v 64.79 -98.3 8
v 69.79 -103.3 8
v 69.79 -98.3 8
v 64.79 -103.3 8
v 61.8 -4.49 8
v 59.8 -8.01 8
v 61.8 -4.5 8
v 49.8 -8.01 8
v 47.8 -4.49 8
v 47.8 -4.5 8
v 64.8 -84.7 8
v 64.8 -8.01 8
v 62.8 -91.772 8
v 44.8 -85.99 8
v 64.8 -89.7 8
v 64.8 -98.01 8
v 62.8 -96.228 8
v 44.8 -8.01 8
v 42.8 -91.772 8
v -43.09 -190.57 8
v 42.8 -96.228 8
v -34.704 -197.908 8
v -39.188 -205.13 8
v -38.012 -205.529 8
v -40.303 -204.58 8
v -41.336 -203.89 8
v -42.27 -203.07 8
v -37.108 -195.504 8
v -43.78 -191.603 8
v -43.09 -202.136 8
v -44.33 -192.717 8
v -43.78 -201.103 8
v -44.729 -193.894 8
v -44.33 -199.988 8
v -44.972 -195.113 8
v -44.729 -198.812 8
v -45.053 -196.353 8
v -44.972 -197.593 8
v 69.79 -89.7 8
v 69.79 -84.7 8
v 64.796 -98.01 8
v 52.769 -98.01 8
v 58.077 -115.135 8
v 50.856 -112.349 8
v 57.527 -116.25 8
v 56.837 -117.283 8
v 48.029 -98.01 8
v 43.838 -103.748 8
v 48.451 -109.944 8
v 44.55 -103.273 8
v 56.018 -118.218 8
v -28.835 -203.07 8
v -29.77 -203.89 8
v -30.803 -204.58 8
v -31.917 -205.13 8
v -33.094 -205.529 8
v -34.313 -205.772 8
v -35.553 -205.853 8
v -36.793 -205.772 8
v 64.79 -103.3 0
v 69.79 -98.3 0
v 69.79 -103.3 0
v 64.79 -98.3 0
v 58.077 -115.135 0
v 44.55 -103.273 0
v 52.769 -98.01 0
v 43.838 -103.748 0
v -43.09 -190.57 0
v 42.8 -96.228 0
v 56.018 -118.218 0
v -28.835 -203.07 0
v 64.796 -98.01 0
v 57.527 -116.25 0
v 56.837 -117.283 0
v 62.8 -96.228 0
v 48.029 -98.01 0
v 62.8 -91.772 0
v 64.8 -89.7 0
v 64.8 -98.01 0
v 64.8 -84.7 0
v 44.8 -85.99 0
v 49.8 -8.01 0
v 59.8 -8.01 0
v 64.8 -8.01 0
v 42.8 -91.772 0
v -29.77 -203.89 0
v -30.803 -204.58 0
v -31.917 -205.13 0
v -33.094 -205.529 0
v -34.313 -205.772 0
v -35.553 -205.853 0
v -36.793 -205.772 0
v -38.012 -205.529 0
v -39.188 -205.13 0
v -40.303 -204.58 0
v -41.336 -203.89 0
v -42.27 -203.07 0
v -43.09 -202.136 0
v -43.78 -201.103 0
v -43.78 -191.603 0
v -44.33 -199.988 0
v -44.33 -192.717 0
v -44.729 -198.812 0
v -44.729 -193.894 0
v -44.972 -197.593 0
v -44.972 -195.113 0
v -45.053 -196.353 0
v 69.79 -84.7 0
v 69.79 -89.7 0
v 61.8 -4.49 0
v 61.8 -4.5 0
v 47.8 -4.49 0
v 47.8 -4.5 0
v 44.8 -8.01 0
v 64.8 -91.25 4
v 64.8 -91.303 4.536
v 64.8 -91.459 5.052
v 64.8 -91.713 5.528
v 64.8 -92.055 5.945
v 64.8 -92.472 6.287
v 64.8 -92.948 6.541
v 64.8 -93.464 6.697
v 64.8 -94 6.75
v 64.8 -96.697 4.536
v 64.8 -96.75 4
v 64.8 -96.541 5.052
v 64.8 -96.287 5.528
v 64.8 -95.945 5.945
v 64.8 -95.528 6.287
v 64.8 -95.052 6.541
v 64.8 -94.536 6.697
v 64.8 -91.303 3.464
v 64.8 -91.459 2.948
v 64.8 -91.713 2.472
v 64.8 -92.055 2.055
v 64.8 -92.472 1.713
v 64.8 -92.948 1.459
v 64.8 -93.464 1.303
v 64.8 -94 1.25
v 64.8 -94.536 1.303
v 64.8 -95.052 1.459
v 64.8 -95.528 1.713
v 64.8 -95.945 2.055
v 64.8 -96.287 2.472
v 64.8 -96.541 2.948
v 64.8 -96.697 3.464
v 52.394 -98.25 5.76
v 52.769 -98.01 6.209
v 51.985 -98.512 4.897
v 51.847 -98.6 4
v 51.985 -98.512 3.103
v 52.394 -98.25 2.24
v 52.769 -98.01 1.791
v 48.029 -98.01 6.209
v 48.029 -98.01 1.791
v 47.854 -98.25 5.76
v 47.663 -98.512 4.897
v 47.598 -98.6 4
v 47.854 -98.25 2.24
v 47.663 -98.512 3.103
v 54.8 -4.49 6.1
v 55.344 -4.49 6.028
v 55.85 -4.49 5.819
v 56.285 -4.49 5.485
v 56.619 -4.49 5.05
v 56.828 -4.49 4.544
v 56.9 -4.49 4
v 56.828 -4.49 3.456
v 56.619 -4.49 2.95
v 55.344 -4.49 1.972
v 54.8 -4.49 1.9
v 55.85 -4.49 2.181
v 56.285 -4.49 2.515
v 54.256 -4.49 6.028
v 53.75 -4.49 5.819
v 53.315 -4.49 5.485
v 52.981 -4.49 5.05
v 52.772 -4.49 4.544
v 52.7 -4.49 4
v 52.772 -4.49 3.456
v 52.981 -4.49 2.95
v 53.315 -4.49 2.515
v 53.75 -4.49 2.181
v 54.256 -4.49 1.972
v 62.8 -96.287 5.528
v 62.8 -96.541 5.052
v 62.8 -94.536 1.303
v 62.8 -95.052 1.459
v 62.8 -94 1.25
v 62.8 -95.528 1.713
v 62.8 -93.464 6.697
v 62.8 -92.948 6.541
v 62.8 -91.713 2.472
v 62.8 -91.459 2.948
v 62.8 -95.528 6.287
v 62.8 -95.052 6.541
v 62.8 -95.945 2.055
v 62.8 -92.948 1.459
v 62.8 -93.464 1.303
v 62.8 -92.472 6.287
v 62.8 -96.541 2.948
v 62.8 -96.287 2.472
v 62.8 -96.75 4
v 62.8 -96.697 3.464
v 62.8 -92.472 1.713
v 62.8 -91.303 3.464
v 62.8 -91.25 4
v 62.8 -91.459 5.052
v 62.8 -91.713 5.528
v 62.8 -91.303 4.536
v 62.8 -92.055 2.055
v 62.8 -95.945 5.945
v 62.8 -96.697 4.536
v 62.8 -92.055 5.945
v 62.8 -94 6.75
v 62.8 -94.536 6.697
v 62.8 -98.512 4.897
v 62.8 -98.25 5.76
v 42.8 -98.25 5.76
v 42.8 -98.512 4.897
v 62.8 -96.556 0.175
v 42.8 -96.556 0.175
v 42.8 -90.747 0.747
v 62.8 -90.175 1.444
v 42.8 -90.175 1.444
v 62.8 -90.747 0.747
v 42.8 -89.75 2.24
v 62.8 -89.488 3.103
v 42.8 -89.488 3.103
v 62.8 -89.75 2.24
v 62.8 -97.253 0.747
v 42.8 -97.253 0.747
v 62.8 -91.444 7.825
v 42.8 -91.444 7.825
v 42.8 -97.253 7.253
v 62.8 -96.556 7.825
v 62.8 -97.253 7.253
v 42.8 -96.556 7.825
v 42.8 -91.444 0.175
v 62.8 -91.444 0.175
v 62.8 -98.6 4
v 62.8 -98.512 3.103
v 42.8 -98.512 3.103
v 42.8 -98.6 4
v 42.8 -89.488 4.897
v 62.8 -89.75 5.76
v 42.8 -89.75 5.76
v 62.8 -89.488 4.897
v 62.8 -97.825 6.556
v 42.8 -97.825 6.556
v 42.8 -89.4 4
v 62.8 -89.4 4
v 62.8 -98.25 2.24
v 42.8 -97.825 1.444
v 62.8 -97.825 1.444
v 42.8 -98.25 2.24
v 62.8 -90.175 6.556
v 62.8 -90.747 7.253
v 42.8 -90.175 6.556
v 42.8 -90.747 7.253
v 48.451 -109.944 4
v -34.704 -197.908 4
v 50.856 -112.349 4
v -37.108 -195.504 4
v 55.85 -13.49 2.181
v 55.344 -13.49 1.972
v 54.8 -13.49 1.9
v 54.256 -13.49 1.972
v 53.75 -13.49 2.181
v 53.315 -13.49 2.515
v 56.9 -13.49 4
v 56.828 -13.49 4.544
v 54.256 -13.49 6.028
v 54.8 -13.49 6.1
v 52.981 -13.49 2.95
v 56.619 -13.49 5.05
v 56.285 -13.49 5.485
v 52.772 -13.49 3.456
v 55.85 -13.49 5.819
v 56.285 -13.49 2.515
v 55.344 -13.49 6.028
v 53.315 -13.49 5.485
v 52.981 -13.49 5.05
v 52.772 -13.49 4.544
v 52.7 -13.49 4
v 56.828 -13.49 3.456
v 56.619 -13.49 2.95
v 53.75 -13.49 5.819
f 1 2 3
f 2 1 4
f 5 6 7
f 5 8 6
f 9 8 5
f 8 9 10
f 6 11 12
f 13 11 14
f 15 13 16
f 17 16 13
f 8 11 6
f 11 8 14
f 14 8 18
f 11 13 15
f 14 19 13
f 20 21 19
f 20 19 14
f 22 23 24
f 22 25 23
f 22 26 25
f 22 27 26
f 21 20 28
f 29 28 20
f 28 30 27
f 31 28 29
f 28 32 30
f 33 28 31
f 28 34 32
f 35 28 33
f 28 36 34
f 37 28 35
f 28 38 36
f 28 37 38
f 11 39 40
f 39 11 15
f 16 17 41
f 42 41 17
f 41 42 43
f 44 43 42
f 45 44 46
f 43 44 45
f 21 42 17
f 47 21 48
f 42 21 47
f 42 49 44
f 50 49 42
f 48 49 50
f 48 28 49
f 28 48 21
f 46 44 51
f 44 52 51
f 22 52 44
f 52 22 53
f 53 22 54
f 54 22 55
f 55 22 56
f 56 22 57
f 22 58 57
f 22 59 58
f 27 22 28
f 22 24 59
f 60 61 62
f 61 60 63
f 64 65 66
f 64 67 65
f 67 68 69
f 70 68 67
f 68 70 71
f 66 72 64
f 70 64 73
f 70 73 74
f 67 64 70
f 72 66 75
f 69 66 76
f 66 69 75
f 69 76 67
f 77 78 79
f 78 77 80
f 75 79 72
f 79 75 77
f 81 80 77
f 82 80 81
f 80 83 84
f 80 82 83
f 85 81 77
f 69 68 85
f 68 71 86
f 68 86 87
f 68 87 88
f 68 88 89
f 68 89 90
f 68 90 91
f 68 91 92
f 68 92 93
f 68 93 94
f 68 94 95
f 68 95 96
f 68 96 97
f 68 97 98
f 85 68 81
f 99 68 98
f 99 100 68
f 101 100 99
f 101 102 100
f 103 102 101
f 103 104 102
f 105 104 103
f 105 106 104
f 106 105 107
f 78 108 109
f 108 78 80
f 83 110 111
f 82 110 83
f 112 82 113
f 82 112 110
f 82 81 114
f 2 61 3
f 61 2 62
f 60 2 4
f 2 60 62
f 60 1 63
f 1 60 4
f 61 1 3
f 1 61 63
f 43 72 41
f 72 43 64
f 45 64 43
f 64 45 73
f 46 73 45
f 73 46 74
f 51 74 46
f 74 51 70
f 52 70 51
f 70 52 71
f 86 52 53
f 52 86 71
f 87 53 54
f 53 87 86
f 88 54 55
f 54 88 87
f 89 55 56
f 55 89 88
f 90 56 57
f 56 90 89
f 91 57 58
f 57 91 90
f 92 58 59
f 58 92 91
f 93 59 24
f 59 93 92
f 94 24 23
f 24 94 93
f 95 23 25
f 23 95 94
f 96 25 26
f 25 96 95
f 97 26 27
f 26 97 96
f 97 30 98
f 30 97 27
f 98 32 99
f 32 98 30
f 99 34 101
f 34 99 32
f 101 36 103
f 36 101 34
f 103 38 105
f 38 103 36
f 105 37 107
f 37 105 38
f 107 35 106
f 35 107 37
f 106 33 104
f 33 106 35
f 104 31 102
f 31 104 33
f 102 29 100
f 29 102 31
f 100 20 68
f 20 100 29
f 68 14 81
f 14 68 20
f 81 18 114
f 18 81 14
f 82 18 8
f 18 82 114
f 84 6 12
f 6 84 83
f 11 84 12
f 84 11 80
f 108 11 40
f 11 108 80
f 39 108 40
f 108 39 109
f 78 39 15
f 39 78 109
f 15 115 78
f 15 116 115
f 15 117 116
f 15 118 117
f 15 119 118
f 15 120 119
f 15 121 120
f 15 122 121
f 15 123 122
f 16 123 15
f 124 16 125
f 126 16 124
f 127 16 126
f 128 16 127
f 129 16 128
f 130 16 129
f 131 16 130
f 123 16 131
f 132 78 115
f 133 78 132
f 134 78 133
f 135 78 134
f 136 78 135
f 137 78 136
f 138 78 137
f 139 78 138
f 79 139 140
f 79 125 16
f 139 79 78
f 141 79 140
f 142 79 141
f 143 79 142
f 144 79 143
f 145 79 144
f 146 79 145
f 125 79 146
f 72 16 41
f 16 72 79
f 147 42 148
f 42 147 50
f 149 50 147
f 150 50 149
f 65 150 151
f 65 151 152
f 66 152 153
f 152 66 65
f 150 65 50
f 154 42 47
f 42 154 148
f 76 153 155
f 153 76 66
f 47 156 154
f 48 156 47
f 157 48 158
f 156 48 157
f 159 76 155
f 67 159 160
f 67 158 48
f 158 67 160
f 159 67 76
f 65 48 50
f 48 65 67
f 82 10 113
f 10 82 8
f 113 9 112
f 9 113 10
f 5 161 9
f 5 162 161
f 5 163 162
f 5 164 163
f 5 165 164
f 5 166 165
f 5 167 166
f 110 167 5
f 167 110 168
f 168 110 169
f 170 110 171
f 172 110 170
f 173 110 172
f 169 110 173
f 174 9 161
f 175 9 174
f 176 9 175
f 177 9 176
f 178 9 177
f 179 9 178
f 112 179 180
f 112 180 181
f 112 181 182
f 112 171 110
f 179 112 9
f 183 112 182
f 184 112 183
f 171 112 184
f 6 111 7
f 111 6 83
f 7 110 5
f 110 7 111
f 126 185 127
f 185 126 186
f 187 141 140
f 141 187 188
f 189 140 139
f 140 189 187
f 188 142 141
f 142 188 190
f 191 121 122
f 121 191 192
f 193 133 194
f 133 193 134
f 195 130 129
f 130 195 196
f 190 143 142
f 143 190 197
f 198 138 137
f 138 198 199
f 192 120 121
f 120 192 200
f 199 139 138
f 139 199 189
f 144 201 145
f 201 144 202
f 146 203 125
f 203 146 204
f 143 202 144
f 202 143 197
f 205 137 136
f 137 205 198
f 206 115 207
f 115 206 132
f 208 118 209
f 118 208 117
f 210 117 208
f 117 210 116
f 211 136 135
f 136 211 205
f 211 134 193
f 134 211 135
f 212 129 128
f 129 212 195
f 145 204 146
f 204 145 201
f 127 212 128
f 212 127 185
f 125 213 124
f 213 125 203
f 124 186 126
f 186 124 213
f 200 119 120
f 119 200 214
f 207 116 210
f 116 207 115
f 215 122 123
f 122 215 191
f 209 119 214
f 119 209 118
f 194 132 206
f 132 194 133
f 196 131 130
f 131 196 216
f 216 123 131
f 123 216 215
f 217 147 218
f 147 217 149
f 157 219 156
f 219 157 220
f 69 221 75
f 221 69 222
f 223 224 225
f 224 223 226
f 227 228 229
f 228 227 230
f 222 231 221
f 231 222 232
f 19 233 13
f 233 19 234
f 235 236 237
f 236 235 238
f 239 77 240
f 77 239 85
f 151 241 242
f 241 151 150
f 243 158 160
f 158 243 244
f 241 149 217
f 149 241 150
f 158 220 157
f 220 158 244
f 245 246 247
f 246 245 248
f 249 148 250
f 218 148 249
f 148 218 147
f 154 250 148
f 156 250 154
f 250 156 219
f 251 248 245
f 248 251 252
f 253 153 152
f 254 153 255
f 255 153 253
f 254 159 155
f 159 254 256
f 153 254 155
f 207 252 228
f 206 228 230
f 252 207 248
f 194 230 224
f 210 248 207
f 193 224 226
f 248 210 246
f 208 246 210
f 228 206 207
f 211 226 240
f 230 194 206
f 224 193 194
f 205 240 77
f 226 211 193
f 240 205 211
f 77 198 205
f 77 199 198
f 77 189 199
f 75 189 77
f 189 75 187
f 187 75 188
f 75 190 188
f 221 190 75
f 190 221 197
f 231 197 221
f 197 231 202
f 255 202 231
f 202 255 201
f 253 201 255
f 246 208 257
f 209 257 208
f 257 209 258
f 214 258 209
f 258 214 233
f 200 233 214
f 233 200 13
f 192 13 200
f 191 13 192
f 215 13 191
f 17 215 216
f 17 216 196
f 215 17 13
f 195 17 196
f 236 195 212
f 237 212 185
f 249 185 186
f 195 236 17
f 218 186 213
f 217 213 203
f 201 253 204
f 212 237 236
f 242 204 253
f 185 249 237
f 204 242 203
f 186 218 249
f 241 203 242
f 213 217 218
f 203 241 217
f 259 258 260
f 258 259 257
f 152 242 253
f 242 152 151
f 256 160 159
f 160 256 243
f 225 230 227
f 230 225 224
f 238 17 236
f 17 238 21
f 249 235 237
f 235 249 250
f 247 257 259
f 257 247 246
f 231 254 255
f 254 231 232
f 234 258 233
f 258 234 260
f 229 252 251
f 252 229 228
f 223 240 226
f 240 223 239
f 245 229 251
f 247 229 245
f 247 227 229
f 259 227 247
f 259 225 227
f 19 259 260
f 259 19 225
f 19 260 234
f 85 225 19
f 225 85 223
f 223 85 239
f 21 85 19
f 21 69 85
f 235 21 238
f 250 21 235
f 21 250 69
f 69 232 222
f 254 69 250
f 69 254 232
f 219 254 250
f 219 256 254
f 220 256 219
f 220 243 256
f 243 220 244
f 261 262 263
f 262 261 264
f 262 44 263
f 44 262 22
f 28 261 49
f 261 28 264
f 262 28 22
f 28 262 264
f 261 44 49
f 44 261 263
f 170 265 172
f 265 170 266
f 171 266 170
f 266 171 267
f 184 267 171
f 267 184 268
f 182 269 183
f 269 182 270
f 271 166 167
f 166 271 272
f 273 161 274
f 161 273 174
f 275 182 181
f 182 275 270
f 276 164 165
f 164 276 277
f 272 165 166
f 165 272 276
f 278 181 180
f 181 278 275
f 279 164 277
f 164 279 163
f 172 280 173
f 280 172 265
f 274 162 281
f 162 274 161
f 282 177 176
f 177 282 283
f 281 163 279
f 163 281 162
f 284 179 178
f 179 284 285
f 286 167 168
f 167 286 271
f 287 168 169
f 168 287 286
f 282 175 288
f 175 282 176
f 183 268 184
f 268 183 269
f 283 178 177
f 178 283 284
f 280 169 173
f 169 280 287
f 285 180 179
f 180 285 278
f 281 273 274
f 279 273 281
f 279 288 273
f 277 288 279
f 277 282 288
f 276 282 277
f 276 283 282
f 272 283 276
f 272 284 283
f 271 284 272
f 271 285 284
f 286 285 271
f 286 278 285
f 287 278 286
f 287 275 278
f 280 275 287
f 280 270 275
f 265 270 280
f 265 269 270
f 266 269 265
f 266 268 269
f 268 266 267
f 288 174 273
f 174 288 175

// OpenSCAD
include <../lib/meshtastic-drybag-node-lib.scad>;
$fn = 40;
panel_plate_print();
